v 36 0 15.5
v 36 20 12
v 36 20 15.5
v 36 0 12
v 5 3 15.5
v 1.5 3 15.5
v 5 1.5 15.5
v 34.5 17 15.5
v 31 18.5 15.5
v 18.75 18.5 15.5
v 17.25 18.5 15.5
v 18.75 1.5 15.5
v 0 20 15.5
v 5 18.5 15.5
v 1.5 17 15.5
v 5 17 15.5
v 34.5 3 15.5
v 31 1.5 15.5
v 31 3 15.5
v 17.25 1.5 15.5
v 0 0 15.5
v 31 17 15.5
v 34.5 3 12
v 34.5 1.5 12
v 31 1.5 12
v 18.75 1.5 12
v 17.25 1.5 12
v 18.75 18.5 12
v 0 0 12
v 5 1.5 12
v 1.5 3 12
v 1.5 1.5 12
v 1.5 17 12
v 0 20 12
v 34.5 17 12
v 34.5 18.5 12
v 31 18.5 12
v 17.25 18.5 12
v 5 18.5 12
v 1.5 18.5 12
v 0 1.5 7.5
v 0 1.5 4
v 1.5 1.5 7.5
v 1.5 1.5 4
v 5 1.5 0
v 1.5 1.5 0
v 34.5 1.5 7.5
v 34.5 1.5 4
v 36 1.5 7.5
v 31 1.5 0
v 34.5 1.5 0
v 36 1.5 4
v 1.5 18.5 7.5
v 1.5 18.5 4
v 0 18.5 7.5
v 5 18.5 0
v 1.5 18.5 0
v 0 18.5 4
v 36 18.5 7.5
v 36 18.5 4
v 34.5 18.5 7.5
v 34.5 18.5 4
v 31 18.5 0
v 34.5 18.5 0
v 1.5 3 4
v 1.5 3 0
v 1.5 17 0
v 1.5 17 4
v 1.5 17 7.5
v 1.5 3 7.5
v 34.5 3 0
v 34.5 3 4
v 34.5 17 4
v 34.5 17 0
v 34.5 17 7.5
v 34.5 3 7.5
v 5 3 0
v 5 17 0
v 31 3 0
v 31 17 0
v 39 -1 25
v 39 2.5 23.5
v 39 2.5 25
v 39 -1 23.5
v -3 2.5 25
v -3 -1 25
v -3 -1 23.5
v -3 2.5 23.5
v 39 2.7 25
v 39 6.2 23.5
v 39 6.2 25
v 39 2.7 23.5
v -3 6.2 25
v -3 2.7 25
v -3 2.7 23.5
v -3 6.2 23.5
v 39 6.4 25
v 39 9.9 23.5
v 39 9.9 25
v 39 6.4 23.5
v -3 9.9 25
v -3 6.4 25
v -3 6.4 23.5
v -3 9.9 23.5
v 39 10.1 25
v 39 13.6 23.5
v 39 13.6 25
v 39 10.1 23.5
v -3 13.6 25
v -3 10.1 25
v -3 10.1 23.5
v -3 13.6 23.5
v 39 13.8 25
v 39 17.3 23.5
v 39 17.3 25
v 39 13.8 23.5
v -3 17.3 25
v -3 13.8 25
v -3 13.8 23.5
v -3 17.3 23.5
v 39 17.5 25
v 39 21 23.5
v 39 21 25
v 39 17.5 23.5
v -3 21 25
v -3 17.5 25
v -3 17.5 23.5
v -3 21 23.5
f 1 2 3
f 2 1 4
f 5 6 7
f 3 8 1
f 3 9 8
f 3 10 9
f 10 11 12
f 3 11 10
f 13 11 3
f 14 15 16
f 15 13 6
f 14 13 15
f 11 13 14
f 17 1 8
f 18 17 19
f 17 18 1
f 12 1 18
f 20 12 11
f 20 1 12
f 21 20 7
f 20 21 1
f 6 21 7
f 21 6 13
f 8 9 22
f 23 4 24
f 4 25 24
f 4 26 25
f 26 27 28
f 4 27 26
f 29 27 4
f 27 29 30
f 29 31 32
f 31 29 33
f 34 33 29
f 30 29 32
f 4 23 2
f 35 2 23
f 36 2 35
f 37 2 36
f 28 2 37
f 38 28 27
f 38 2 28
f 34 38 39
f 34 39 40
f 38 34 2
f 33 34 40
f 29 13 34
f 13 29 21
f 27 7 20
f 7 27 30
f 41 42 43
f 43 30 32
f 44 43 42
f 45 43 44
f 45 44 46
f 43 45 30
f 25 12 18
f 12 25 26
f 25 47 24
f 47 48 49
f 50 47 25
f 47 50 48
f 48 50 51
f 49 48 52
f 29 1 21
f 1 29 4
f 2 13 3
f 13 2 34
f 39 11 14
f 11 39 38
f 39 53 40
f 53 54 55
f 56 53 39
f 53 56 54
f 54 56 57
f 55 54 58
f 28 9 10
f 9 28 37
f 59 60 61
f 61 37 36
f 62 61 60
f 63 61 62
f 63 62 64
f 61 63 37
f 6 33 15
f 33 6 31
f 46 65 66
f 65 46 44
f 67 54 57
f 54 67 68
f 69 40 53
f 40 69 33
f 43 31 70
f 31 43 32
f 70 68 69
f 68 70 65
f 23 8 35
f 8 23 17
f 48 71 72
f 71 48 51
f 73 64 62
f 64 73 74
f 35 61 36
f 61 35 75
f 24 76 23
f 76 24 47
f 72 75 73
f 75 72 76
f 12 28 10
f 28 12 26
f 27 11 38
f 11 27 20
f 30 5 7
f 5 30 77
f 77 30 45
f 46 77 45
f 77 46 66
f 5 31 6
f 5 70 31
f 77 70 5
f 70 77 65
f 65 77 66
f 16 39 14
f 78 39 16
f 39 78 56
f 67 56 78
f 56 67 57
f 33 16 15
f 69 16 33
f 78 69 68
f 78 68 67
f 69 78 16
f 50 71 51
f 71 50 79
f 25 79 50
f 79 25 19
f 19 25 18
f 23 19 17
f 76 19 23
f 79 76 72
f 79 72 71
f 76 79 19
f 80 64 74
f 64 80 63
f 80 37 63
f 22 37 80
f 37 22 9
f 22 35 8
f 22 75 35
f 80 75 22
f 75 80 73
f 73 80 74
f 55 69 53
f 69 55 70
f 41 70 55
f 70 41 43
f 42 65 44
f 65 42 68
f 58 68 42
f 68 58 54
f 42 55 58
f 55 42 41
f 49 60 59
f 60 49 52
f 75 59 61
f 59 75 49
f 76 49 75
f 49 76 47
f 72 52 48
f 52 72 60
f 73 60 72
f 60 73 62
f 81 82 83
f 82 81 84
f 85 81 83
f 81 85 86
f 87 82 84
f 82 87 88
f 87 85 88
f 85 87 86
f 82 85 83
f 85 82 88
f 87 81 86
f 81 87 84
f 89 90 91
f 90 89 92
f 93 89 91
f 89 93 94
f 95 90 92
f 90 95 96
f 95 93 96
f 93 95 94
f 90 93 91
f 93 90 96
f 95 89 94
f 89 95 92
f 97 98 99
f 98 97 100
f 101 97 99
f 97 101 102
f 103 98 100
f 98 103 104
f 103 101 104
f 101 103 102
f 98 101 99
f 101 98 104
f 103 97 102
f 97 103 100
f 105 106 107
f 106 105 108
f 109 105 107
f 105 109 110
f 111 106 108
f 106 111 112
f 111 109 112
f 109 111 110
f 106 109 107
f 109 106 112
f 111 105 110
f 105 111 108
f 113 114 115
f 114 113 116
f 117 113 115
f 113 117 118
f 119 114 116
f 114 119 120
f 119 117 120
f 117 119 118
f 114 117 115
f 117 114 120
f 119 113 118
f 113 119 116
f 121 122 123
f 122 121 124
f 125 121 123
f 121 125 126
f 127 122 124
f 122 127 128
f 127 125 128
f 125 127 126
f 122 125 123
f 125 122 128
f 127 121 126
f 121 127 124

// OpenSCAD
// bench.scad — slat-top bench built from 2x4 dimensional lumber
// Reproduces the design in bench1.png.
// Units: inches. X = length, Y = width, Z = height.

// ---- dimensional lumber (actual sizes) ----
TWOBY_T = 1.5;   // 2x4 thickness
TWOBY_W = 3.5;   // 2x4 width

// ---- overall design dimensions (from bench1.png) ----
TOP_LEN     = 42;    // top length
TOP_WID     = 22;    // top width
FRAME_LEN   = 36;    // apron frame outer length
FRAME_WID   = 20;    // apron frame outer width
BENCH_H     = 17;    // overall height
N_SLATS     = 6;     // slats across the 22" top

LEG_H       = BENCH_H - TWOBY_T;          // legs stop under the top slats
STRETCHER_Z = 4;                          // height of side stretcher above floor
SLAT_GAP    = (TOP_WID - N_SLATS*TWOBY_W) / (N_SLATS - 1);

EXPLODE = 8;   // lift of the top for the exploded view; set 0 to assemble

wood      = [0.72, 0.45, 0.20];
wood_dark = [0.60, 0.35, 0.15];

// ============ lumber pieces ============

// generic 2x4 stick, laid along X, cross-section t (Z) x w (Y)
module two_by_four(length, w = TWOBY_W, t = TWOBY_T) {
    cube([length, w, t]);
}

// --- top ---
// 2x4 laid flat, full 42" length
module top_slat() {
    color(wood) two_by_four(TOP_LEN);
}

// --- apron frame (2x4s on edge) ---
// long apron rail, full 36" — runs the length of the frame
module apron_long() {
    color(wood_dark) cube([FRAME_LEN, TWOBY_T, TWOBY_W]);
}

// short apron rail, fits between the long rails
module apron_short() {
    color(wood_dark) cube([TWOBY_T, FRAME_WID - 2*TWOBY_T, TWOBY_W]);
}

// center cross rail, same as a short apron rail
module cross_rail() {
    apron_short();
}

// --- legs ---
// 2x4 leg, floor to underside of top; wide face bolts to the long apron rail
module leg() {
    color(wood) cube([TWOBY_W, TWOBY_T, LEG_H]);
}

// --- side stretcher ---
// low rail across the two legs of one end (17" tip to tip)
module stretcher() {
    color(wood_dark) cube([TWOBY_T, FRAME_WID - 2*TWOBY_T, TWOBY_W]);
}

// ============ assemblies ============

module top_assembly() {
    for (i = [0 : N_SLATS-1])
        translate([0, i*(TWOBY_W + SLAT_GAP), 0])
            top_slat();
}

module apron_assembly() {
    // two long rails
    translate([0, 0, 0])                     apron_long();
    translate([0, FRAME_WID - TWOBY_T, 0])   apron_long();
    // two end rails
    translate([0, TWOBY_T, 0])                       apron_short();
    translate([FRAME_LEN - TWOBY_T, TWOBY_T, 0])     apron_short();
    // center cross rail
    translate([FRAME_LEN/2 - TWOBY_T/2, TWOBY_T, 0]) cross_rail();
}

module base_assembly() {
    // apron frame sits at the top of the legs
    translate([0, 0, LEG_H - TWOBY_W]) apron_assembly();

    // legs against the inside of the long rails, inset 1.5" from each end:
    // outer faces land 33" apart along the length, 17" across the width
    leg_x = [TWOBY_T, FRAME_LEN - TWOBY_T - TWOBY_W];
    leg_y = [TWOBY_T, FRAME_WID - TWOBY_T - TWOBY_T];
    for (x = leg_x, y = leg_y)
        translate([x, y, 0]) leg();

    // side stretchers bolted across the end-facing faces of each leg pair
    stretcher_x = [leg_x[0] - TWOBY_T, leg_x[1] + TWOBY_W];
    for (x = stretcher_x)
        translate([x, TWOBY_T, STRETCHER_Z])
            stretcher();
}

module bench(explode = EXPLODE) {
    base_assembly();
    // top centered over the frame
    translate([(FRAME_LEN - TOP_LEN)/2, (FRAME_WID - TOP_WID)/2,
               LEG_H + explode])
        top_assembly();
}

bench();
